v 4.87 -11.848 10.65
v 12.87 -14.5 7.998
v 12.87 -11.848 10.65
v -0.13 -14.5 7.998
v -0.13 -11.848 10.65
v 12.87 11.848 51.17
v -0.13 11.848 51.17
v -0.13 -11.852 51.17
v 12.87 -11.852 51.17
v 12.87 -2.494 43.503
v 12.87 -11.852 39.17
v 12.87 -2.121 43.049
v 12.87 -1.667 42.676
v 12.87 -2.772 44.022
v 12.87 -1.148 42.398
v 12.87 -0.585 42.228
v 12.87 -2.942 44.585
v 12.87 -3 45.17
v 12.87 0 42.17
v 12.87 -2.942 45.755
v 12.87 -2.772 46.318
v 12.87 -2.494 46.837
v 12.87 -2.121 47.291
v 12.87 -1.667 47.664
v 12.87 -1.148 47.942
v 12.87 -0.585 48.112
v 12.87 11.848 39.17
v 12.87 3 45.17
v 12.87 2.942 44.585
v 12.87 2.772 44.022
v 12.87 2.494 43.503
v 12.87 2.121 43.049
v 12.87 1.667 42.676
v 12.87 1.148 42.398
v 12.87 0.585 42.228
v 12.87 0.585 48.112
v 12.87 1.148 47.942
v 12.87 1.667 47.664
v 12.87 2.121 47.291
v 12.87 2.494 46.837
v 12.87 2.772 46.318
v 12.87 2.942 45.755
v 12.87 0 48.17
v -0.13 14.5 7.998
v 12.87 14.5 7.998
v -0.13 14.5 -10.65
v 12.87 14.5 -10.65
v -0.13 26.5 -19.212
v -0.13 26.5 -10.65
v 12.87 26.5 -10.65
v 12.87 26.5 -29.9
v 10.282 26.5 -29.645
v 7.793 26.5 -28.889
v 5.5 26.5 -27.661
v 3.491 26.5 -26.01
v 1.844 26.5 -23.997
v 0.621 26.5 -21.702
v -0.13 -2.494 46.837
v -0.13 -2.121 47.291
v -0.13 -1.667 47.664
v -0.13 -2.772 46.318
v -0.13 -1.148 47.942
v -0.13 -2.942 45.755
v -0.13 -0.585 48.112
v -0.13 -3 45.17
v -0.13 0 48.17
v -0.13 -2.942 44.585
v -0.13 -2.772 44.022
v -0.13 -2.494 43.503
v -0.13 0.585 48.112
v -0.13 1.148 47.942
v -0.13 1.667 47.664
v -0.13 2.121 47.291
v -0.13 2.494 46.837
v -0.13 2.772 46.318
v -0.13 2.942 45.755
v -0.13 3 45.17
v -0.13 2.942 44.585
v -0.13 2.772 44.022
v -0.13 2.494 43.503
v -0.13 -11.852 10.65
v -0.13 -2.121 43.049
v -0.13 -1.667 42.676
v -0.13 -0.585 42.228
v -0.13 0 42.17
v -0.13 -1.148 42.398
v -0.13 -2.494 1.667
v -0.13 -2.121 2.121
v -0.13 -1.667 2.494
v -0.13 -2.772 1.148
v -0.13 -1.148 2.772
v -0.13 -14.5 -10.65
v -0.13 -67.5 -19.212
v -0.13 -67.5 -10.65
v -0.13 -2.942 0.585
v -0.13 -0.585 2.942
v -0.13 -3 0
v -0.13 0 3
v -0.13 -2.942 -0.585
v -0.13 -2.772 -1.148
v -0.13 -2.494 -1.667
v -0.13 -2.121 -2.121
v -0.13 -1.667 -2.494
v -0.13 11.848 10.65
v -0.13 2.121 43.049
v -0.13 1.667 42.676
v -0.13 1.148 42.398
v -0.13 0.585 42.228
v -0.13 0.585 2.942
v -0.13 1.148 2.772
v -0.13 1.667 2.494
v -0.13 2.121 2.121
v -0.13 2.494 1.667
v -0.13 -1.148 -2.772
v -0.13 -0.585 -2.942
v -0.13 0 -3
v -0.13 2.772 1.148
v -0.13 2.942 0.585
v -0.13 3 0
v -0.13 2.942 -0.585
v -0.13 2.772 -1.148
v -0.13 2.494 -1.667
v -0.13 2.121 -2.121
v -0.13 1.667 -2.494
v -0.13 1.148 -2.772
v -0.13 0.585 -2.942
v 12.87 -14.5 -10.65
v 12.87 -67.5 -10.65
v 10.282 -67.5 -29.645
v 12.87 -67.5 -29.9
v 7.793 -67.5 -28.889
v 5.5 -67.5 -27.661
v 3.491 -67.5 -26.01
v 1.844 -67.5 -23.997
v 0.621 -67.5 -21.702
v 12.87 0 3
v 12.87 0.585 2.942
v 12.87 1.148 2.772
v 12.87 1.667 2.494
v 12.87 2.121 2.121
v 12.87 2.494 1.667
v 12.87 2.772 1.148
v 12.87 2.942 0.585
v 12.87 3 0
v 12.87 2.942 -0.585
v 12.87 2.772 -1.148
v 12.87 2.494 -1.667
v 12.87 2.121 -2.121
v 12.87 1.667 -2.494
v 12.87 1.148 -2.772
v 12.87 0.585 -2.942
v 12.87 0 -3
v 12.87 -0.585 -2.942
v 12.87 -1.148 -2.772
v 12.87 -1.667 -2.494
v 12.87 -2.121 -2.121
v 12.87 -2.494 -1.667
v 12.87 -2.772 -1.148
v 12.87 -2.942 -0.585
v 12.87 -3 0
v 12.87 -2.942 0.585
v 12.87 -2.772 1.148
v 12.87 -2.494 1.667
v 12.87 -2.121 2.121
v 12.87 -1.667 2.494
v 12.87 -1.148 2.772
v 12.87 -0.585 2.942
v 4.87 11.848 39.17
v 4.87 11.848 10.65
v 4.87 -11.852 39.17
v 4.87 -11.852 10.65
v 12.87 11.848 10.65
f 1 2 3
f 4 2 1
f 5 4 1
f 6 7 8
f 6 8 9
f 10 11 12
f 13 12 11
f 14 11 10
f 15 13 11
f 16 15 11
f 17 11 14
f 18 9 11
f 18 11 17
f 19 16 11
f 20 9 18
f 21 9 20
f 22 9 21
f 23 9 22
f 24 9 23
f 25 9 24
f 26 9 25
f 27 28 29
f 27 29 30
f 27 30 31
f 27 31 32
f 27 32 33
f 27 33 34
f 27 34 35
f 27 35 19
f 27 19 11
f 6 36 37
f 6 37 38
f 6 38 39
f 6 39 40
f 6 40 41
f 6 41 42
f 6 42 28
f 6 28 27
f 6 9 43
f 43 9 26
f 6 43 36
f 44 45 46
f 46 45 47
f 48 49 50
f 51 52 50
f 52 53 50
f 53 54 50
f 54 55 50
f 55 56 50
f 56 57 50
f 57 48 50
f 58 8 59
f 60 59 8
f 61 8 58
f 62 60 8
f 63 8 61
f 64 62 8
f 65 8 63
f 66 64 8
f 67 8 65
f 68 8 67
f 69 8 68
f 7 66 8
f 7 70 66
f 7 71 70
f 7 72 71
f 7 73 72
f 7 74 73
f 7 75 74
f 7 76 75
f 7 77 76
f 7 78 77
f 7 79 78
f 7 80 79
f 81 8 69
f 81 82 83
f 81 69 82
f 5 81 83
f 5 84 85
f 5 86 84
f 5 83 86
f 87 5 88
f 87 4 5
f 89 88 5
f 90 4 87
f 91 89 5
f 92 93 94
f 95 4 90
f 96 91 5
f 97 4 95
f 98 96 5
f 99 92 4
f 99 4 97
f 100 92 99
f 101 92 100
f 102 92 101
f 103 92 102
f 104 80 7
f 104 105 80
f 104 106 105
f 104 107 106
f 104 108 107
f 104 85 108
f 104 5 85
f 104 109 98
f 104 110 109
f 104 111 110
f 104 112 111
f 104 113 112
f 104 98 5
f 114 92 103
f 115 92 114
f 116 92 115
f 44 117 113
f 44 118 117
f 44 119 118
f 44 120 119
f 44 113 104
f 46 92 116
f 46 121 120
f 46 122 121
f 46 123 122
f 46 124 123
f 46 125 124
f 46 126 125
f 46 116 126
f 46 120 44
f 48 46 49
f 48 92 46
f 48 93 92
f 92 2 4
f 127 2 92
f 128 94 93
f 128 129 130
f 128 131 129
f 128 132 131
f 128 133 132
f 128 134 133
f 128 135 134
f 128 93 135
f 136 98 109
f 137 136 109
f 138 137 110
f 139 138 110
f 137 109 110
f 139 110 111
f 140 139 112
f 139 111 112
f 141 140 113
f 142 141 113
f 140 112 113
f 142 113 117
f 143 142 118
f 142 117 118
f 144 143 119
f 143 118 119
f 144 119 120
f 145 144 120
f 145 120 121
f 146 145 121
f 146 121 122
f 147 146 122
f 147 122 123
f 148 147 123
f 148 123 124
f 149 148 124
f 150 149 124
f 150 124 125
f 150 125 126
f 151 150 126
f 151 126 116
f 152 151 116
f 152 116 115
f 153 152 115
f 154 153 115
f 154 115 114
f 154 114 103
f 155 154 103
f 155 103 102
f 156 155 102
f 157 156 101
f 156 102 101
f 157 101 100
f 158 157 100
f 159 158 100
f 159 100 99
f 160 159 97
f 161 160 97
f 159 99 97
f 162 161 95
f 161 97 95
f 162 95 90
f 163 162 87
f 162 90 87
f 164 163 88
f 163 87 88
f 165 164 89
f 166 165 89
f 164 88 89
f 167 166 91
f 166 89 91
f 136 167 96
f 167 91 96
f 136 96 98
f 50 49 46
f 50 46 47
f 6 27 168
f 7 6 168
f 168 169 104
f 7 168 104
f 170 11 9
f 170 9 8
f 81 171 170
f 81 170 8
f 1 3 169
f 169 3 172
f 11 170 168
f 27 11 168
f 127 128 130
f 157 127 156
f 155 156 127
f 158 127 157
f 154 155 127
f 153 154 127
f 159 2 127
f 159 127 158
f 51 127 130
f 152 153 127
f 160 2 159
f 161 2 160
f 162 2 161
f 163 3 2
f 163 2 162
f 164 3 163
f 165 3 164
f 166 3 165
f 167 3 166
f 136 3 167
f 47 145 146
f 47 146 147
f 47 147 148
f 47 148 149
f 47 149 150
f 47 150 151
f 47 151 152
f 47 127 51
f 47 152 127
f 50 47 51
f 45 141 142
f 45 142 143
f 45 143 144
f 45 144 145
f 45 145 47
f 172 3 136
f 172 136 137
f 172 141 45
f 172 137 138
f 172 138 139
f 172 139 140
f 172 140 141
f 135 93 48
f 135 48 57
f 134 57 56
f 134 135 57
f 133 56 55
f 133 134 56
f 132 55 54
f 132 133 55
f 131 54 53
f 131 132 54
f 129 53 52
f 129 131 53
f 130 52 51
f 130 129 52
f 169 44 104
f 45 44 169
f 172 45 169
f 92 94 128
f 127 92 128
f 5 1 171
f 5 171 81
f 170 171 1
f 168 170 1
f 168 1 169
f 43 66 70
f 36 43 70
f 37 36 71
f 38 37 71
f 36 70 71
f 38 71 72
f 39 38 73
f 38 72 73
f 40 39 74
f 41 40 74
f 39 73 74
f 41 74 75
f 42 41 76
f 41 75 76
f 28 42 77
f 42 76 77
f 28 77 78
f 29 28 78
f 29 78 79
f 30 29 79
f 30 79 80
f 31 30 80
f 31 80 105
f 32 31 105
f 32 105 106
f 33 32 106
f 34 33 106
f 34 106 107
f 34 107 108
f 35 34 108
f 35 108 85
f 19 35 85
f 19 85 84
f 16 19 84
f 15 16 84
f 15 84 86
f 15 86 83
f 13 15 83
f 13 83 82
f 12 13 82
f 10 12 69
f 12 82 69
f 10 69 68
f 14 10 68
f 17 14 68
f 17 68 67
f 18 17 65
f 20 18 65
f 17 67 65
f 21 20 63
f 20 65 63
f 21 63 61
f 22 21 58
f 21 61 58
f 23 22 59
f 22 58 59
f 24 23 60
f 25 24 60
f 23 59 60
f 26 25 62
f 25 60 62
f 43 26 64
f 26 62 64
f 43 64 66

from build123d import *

# Parameters (mm, degrees)
SKETCH1_W                       = 21.3
SKETCH1_H                       = 29
BOSS_EXTRUDE1_DEPTH             = 25.87
CUT_EXTRUDE1_DEPTH              = 32.510782282
SKETCH5_W                       = 5
SKETCH5_H                       = 23.7
BOSS_EXTRUDE2_DEPTH             = 31.52
SKETCH6_W                       = 5
SKETCH6_H                       = 23.7
BOSS_EXTRUDE3_DEPTH             = 15.9
SKETCH7_W                       = 25.87
SKETCH7_H                       = 94
BOSS_EXTRUDE4_DEPTH             = 20
CUT_EXTRUDE2_DEPTH              = 107.224130027
SKETCH10_W                      = 25.87
SKETCH10_H                      = 23.7
BOSS_EXTRUDE5_DEPTH             = 9
SKETCH13_W                      = 25.74
SKETCH13_H                      = 140
CUT_EXTRUDE3_DEPTH              = 109.61791657
SKETCH14_W                      = 7
SKETCH14_H                      = 23.7
BOSS_EXTRUDE6_DEPTH             = 8
F_6_0MM_CLEARANCE_DOWEL_HOLE1_D = 6


with BuildPart() as part:
    # Sketch1 → Boss-Extrude1 (new body)
    with BuildSketch(Plane(origin=(0, 0, 0), x_dir=(0, 0, -1), z_dir=(1, 0, 0))):
        Rectangle(SKETCH1_W, SKETCH1_H)
    boss_extrude1 = extrude(amount=BOSS_EXTRUDE1_DEPTH)

    # Sketch3 → Cut-Extrude1 (cut, through all)
    with BuildSketch(Plane(origin=(25.87, 0, 0), x_dir=(0, 0, -1), z_dir=(1, 0, 0))):
        Polygon((-7.998349571, -14.5), (-10.65, -11.848349571), (-10.65, -14.5), align=None)
        Polygon((-10.65, 11.848349571), (-10.65, 14.5), (-7.998349571, 14.5), align=None)
    cut_extrude1 = extrude(amount=-CUT_EXTRUDE1_DEPTH, mode=Mode.SUBTRACT)

    # Sketch5 → Boss-Extrude2 (add)
    with BuildSketch(Plane.XY.offset(10.65)):
        with Locations((23.37, -0.001650429)):
            Rectangle(SKETCH5_W, SKETCH5_H)
        with Locations((2.5, -0.001650429)):
            Rectangle(SKETCH5_W, SKETCH5_H)
    boss_extrude2 = extrude(amount=BOSS_EXTRUDE2_DEPTH)

    # Sketch6 → Boss-Extrude3 (add)
    with BuildSketch(Plane.ZY.offset(-20.87)):
        with Locations((39.67, -0.001650429)):
            Rectangle(SKETCH6_W, SKETCH6_H)
    extrude(amount=BOSS_EXTRUDE3_DEPTH)

    # Sketch7 → Boss-Extrude4 (add)
    with BuildSketch(Plane(origin=(0, 0, -10.65), x_dir=(-1, 0, 0), z_dir=(0, 0, -1))):
        with Locations((-12.935, -20.5)):
            Rectangle(SKETCH7_W, SKETCH7_H)
    boss_extrude4 = extrude(amount=BOSS_EXTRUDE4_DEPTH)

    # Sketch9 → Cut-Extrude2 (cut, through all)
    with BuildSketch(Plane(origin=(0, -67.5, 0), x_dir=(-1, 0, 0), z_dir=(0, -1, 0))):
        with BuildLine():
            ThreePointArc((-26.12, 16.65), (-12.87, 29.9), (0.38, 16.65))
            Line((0.38, 16.65), (0.38, 30.65))
            Line((0.38, 30.65), (-26.12, 30.65))
            Line((-26.12, 30.65), (-26.12, 16.65))
        make_face()
    cut_extrude2 = extrude(amount=-CUT_EXTRUDE2_DEPTH, mode=Mode.SUBTRACT)

    # Sketch10 → Boss-Extrude5 (add)
    with BuildSketch(Plane.XY.offset(42.17)):
        with Locations((12.935, -0.001650429)):
            Rectangle(SKETCH10_W, SKETCH10_H)
    boss_extrude5 = extrude(amount=BOSS_EXTRUDE5_DEPTH)

    # Sketch13 → Cut-Extrude3 (cut, through all)
    with BuildSketch(Plane.XY.offset(51.17)):
        with Locations((0, -0.001650429)):
            Rectangle(SKETCH13_W, SKETCH13_H)
    cut_extrude3 = extrude(amount=-CUT_EXTRUDE3_DEPTH, mode=Mode.SUBTRACT)

    # Mirror2: Boss-Extrude1, Cut-Extrude1, Boss-Extrude2, Boss-Extrude4, Cut-Extrude2, Boss-Extrude5, Cut-Extrude3 across plane
    add(boss_extrude1.mirror(Plane(origin=(12.87, 69.998349571, -29.9), x_dir=(0, 0, 1), z_dir=(1, 0, 0))))
    add(cut_extrude1.mirror(Plane(origin=(12.87, 69.998349571, -29.9), x_dir=(0, 0, 1), z_dir=(1, 0, 0))), mode=Mode.SUBTRACT)
    add(boss_extrude2.mirror(Plane(origin=(12.87, 69.998349571, -29.9), x_dir=(0, 0, 1), z_dir=(1, 0, 0))))
    add(boss_extrude4.mirror(Plane(origin=(12.87, 69.998349571, -29.9), x_dir=(0, 0, 1), z_dir=(1, 0, 0))))
    add(cut_extrude2.mirror(Plane(origin=(12.87, 69.998349571, -29.9), x_dir=(0, 0, 1), z_dir=(1, 0, 0))), mode=Mode.SUBTRACT)
    add(boss_extrude5.mirror(Plane(origin=(12.87, 69.998349571, -29.9), x_dir=(0, 0, 1), z_dir=(1, 0, 0))))
    add(cut_extrude3.mirror(Plane(origin=(12.87, 69.998349571, -29.9), x_dir=(0, 0, 1), z_dir=(1, 0, 0))), mode=Mode.SUBTRACT)

    # Sketch14 → Boss-Extrude6 (add)
    with BuildSketch(Plane(origin=(4.87, 0, 0), x_dir=(0, 0, -1), z_dir=(1, 0, 0))):
        with Locations((-42.67, -0.001650429)):
            Rectangle(SKETCH14_W, SKETCH14_H)
    extrude(amount=BOSS_EXTRUDE6_DEPTH)

    # Ø6.0mm Clearance Dowel Hole1 (through all)
    with Locations(Plane(origin=(12.87, 0, 0), x_dir=(0, 0, -1), z_dir=(1, 0, 0))):
        with Locations((-45.17, 0), (0, 0)):
            Hole(F_6_0MM_CLEARANCE_DOWEL_HOLE1_D / 2)


solid = part.part
